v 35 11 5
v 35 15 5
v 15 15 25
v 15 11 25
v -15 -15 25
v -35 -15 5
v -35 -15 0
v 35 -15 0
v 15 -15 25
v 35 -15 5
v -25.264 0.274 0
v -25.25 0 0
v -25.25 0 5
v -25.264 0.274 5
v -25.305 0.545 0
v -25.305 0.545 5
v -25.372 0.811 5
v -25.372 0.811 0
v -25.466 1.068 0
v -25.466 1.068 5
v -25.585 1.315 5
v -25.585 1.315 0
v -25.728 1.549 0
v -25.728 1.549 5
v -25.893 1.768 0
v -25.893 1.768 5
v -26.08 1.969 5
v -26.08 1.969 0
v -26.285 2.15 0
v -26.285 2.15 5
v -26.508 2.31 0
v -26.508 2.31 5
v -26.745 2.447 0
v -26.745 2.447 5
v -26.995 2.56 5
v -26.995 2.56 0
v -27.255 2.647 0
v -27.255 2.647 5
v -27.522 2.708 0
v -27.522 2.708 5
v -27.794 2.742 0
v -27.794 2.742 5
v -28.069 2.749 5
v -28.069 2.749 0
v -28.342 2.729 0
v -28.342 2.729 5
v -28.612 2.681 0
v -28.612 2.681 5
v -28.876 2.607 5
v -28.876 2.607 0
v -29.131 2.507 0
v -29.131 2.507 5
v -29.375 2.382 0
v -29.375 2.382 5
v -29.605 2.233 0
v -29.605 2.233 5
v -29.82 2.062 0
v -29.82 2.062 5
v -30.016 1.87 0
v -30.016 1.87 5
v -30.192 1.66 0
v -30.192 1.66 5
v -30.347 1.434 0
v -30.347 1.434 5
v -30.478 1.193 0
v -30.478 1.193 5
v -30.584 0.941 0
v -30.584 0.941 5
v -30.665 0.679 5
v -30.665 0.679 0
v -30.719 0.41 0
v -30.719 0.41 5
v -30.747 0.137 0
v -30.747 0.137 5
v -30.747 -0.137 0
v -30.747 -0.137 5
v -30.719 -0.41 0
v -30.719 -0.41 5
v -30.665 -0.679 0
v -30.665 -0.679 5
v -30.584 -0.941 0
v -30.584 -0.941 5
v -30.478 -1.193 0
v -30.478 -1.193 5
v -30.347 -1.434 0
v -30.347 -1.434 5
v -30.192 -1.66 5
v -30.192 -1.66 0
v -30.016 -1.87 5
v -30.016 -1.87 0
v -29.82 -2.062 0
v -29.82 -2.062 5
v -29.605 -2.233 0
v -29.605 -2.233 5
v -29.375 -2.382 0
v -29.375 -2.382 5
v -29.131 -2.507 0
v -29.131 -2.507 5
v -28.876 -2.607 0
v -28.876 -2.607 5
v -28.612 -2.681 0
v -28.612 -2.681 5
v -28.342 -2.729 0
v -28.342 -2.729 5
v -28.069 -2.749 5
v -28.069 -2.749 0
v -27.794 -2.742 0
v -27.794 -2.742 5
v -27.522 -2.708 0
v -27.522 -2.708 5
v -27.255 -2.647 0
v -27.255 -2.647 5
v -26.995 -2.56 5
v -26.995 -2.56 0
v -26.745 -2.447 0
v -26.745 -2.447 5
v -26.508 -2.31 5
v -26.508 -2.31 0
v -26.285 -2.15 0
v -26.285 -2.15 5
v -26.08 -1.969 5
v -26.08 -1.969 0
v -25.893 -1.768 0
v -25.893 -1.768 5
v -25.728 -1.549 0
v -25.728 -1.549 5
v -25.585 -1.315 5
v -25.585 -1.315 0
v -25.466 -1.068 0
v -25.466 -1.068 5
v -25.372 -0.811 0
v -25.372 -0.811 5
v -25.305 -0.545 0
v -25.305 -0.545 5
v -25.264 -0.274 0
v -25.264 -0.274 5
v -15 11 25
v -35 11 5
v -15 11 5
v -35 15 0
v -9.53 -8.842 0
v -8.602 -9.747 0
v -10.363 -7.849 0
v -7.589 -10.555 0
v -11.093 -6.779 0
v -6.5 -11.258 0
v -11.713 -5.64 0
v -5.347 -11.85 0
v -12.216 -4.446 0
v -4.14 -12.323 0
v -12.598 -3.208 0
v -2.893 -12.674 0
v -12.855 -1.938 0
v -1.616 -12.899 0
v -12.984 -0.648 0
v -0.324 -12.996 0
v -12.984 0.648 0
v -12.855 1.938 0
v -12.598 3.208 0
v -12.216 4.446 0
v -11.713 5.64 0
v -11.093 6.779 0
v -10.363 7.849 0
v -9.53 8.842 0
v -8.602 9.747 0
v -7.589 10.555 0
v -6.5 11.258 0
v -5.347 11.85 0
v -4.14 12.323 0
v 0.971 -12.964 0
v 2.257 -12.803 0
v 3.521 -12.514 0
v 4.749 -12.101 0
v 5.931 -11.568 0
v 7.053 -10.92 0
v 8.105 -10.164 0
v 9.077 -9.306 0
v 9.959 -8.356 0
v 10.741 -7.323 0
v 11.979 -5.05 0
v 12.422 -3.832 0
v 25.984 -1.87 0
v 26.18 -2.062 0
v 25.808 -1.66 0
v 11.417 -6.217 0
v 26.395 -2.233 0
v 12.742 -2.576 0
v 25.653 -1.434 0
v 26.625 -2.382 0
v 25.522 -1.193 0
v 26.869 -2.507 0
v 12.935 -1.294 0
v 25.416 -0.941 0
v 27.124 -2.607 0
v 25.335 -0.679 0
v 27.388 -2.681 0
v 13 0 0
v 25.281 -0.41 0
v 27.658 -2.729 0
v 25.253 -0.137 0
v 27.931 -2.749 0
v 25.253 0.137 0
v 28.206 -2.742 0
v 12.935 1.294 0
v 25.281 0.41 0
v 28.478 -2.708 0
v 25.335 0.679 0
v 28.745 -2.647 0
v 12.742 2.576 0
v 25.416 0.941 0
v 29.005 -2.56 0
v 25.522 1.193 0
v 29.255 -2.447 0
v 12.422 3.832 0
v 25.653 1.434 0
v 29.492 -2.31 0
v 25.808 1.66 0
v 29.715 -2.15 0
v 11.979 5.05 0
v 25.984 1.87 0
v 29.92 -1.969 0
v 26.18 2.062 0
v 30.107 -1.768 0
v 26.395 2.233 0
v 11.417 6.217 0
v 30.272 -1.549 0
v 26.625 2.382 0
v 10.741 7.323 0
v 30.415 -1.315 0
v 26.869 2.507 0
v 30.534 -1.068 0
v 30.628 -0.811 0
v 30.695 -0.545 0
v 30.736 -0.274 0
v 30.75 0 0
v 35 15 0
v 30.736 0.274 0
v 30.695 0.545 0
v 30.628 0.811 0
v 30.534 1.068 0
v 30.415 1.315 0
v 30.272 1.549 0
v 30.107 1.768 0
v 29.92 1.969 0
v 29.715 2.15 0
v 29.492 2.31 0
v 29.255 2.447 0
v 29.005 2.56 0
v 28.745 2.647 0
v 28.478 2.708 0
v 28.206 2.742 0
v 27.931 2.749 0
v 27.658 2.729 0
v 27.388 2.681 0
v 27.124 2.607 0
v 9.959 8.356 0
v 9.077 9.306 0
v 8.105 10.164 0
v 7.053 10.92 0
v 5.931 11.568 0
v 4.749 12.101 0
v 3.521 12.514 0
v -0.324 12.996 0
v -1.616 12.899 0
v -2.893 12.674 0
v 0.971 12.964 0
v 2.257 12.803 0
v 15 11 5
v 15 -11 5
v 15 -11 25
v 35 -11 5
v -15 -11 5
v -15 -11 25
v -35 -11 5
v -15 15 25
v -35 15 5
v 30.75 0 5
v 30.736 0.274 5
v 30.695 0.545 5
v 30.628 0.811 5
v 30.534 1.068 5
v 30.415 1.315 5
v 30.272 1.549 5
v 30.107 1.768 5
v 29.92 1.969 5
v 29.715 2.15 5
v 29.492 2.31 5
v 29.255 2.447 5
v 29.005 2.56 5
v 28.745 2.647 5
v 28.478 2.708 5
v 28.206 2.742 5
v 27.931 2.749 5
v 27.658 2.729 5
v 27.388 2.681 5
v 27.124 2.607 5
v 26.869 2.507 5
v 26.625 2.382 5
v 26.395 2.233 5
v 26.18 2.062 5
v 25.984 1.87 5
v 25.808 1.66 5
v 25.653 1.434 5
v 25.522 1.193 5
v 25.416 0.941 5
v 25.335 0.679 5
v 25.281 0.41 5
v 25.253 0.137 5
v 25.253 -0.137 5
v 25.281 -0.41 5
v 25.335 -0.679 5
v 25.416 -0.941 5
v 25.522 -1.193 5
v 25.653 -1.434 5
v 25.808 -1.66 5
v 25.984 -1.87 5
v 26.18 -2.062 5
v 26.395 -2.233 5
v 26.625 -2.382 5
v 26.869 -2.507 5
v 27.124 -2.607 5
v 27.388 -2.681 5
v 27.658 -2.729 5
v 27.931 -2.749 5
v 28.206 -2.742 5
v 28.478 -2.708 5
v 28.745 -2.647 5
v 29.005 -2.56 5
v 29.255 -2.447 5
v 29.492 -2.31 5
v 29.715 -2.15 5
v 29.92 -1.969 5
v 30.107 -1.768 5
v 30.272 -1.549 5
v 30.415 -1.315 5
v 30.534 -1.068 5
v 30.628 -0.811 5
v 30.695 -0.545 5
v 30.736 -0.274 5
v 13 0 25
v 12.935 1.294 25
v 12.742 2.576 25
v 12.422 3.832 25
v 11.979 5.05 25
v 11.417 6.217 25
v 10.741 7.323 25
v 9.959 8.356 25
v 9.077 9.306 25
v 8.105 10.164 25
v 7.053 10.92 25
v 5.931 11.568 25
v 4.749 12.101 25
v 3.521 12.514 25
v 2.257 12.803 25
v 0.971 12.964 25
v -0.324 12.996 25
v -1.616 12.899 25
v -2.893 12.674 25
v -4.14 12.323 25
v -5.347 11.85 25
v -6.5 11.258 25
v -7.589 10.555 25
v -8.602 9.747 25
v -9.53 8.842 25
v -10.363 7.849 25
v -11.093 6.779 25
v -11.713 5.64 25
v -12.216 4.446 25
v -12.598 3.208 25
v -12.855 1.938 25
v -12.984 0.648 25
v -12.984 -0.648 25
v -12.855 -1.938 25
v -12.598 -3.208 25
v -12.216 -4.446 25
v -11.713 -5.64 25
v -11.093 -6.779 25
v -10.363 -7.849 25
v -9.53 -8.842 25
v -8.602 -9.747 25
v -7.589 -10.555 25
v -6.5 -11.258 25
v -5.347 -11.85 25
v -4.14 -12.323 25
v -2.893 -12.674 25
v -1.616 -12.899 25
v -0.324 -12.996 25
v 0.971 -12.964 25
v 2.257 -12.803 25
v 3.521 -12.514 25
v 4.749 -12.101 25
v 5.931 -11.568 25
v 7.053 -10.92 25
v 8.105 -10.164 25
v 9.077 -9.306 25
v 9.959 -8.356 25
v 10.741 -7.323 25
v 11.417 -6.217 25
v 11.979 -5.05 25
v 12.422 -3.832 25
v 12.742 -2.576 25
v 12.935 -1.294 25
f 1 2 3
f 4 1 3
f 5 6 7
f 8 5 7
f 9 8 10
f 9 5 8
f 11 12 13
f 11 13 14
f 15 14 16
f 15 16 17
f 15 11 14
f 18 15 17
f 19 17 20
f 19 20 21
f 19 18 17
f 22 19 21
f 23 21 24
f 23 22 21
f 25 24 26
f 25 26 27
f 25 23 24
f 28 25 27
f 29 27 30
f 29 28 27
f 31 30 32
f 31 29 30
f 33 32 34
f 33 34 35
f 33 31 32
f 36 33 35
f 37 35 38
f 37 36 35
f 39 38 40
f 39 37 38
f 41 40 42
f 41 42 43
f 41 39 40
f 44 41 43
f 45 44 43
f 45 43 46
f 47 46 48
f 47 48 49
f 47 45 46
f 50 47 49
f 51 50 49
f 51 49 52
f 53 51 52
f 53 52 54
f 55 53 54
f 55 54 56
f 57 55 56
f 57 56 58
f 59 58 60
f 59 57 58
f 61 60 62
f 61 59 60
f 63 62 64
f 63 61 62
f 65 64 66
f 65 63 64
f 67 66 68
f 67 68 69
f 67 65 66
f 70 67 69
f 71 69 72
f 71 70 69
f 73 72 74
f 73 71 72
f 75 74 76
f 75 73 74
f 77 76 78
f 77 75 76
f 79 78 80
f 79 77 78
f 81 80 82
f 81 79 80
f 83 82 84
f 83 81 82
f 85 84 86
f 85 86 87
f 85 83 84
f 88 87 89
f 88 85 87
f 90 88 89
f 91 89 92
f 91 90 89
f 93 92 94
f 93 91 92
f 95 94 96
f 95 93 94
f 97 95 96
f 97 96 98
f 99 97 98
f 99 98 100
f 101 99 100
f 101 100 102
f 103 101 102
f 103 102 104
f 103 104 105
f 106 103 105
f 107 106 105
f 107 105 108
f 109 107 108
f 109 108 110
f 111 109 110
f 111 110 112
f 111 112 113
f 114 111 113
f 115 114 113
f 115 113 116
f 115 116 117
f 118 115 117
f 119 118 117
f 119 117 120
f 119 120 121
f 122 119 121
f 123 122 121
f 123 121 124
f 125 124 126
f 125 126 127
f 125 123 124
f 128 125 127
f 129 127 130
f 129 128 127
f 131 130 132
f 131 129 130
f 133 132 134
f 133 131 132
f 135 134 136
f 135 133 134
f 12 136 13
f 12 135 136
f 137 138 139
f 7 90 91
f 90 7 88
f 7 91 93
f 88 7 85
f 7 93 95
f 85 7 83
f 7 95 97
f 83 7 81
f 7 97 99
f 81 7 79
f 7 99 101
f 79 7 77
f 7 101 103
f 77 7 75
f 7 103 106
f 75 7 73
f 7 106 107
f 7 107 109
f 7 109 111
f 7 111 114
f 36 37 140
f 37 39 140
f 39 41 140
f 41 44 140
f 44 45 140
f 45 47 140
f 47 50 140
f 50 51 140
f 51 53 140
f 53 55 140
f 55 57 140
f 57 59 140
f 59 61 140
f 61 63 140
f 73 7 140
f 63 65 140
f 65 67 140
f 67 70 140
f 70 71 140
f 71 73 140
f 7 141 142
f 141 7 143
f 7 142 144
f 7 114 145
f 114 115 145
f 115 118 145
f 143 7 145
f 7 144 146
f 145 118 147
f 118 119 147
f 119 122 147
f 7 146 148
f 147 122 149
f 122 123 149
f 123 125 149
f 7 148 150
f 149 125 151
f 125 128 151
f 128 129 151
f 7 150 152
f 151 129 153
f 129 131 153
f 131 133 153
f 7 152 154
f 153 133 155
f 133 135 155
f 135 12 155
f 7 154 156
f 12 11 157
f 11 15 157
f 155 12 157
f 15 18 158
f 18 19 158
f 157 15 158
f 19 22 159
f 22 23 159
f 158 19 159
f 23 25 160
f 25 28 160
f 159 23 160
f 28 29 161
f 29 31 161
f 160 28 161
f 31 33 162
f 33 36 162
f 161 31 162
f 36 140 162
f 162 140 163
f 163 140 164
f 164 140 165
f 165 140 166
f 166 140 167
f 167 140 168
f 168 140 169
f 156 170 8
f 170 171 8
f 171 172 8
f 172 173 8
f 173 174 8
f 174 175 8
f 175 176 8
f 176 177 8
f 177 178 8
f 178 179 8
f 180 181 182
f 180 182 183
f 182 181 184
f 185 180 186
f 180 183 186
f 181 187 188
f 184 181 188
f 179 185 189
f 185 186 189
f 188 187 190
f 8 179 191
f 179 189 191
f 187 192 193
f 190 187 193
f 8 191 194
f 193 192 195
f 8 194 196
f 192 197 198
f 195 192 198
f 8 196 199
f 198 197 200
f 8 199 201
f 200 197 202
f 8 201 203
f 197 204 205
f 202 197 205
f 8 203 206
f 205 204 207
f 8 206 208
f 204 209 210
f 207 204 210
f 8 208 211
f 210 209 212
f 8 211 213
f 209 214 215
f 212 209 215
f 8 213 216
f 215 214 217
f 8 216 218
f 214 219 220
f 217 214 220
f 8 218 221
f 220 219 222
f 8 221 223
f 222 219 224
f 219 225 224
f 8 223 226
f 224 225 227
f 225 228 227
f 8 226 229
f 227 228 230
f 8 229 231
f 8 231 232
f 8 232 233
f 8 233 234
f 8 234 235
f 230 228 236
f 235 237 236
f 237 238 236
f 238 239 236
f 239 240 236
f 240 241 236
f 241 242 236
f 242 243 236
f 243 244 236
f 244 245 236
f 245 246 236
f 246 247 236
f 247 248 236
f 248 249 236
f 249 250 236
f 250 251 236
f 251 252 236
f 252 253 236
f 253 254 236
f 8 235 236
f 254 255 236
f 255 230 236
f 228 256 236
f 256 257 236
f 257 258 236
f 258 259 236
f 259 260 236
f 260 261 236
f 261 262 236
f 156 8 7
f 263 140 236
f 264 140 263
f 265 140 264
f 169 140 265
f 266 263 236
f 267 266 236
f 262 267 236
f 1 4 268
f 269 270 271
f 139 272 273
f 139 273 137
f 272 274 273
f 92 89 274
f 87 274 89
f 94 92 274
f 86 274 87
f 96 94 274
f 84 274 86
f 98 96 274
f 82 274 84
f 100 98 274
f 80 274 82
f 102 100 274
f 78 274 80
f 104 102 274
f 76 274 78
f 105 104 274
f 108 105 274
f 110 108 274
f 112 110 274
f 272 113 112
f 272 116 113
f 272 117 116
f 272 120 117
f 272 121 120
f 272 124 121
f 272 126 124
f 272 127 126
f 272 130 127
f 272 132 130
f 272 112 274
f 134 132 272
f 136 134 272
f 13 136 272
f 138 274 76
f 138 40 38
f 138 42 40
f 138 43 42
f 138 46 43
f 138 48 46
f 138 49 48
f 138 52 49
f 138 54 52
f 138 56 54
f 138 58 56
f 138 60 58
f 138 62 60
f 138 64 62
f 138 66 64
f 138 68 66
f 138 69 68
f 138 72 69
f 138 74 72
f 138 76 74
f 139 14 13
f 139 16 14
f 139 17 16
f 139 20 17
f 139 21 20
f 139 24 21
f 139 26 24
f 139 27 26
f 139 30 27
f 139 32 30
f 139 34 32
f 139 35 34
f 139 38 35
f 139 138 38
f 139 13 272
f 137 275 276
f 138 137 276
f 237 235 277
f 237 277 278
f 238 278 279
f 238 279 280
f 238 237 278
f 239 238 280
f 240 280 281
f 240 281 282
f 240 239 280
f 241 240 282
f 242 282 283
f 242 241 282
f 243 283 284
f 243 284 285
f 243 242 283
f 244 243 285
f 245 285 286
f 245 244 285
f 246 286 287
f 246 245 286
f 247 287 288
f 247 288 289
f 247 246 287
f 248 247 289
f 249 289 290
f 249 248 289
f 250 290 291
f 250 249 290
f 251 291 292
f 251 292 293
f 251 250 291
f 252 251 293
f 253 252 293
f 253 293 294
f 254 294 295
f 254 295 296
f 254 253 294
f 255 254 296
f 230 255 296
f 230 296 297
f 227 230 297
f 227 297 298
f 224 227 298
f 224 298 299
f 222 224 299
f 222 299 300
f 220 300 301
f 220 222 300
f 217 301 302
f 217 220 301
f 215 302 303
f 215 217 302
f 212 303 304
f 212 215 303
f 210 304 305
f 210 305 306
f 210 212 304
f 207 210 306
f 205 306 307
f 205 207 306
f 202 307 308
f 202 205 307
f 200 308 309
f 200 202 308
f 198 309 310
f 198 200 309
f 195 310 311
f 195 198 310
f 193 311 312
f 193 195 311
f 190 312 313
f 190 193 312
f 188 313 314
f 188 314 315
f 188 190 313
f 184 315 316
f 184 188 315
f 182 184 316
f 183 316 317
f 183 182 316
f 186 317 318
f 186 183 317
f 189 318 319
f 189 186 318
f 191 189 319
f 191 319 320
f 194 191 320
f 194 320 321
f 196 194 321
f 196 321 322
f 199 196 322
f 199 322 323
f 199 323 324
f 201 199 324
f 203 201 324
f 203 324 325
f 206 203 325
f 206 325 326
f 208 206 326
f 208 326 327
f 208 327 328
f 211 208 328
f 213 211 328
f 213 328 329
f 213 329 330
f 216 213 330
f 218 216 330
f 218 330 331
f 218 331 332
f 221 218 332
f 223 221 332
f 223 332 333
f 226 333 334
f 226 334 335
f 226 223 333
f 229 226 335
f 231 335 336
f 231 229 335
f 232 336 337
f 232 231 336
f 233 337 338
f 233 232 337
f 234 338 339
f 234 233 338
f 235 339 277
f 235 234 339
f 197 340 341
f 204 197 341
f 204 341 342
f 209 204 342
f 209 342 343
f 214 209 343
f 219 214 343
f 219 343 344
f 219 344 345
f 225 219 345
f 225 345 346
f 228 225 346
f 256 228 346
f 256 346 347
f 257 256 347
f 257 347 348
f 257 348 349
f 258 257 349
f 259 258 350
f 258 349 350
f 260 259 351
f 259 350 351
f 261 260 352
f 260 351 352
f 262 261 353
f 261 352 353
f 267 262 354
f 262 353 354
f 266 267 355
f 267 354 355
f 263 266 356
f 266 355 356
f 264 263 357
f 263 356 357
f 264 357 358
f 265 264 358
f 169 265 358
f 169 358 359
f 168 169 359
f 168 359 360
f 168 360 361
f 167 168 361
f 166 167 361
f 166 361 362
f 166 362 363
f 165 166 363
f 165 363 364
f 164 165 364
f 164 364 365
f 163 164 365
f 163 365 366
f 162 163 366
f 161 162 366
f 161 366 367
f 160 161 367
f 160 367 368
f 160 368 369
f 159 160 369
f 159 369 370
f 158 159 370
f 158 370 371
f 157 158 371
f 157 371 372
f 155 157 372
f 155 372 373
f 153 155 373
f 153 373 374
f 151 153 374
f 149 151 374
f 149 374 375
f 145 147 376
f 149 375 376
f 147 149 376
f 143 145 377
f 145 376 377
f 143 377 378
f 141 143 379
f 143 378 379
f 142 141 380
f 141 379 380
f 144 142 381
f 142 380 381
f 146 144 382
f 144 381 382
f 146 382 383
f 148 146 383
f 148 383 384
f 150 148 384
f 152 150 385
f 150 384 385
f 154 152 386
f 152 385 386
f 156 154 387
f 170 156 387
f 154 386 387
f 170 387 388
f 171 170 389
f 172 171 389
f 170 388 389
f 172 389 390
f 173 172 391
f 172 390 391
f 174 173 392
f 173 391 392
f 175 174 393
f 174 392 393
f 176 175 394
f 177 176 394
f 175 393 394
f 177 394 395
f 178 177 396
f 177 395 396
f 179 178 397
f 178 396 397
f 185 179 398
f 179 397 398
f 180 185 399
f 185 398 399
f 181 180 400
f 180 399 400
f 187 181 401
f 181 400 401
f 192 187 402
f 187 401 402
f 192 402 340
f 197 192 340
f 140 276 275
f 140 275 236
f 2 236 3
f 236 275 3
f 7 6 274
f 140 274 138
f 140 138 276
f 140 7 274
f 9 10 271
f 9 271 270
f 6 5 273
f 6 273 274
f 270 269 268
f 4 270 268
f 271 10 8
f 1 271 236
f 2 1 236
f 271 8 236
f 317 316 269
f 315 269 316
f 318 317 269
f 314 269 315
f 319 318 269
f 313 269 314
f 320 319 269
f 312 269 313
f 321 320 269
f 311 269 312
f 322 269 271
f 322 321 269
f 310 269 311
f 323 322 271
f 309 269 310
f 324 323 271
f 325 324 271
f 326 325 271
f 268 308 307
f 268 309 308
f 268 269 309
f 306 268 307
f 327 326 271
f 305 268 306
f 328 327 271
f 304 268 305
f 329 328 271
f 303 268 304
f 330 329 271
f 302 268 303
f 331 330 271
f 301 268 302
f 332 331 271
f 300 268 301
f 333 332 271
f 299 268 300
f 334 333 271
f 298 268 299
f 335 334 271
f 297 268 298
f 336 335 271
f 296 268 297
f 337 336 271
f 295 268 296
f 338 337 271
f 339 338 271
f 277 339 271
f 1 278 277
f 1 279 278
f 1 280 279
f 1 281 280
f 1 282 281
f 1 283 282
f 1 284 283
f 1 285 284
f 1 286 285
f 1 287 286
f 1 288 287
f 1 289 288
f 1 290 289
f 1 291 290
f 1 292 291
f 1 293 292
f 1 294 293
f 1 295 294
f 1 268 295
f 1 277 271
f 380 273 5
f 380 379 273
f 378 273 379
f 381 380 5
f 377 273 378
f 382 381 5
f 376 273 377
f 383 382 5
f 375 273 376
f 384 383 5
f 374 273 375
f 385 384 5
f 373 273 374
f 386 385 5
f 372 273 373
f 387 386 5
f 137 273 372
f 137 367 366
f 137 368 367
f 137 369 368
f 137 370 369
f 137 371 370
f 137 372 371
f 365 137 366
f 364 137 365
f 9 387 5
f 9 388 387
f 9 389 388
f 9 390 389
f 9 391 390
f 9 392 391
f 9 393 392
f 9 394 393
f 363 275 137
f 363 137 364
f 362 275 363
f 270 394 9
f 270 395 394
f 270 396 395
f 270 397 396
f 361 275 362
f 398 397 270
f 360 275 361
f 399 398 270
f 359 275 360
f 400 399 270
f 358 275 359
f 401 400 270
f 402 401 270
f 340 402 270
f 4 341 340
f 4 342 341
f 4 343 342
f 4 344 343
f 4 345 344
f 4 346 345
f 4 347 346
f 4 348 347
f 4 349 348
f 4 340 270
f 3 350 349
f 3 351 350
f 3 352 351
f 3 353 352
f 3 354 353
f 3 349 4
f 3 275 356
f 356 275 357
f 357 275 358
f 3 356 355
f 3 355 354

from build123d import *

# Parameters (mm, degrees)
SKETCH_1_W          = 70
SKETCH_1_H          = 30
SKETCH_1_R          = 2.75
EXTRUDE_1_DEPTH     = 5
SKETCH_2_W          = 30
SKETCH_2_H          = 30
EXTRUDE_2_DEPTH     = 20
SKETCH_3_R          = 13
CUT_EXTRUDE_1_DEPTH = 26
EXTRUDE_3_DEPTH     = 4


with BuildPart() as part:
    # 草图1 → 凸台-拉伸1 (new body)
    with BuildSketch(Plane.XY):
        Rectangle(SKETCH_1_W, SKETCH_1_H)
        with Locations((-28, 0)):
            Circle(SKETCH_1_R, mode=Mode.SUBTRACT)
        with Locations((28, 0)):
            Circle(SKETCH_1_R, mode=Mode.SUBTRACT)
    extrude(amount=EXTRUDE_1_DEPTH)

    # 草图2 → 凸台-拉伸2 (add)
    with BuildSketch(Plane.XY.offset(5)):
        Rectangle(SKETCH_2_W, SKETCH_2_H)
    extrude(amount=EXTRUDE_2_DEPTH)

    # 草图3 → 切除-拉伸1 (cut, through all)
    with BuildSketch(Plane.XY.offset(25)):
        Circle(SKETCH_3_R)
    extrude(amount=-CUT_EXTRUDE_1_DEPTH, mode=Mode.SUBTRACT)

    # 草图4 → 凸台-拉伸3 (add)
    with BuildSketch(Plane.XZ.offset(15)):
        Polygon((-15, 25), (-35, 5), (-15, 5), align=None)
        Polygon((15, 25), (15, 5), (35, 5), align=None)
    extrude_3 = extrude(amount=-EXTRUDE_3_DEPTH)

    # 镜向1: 凸台-拉伸3 across plane
    add(extrude_3.mirror(Plane.ZX))


solid = part.part
